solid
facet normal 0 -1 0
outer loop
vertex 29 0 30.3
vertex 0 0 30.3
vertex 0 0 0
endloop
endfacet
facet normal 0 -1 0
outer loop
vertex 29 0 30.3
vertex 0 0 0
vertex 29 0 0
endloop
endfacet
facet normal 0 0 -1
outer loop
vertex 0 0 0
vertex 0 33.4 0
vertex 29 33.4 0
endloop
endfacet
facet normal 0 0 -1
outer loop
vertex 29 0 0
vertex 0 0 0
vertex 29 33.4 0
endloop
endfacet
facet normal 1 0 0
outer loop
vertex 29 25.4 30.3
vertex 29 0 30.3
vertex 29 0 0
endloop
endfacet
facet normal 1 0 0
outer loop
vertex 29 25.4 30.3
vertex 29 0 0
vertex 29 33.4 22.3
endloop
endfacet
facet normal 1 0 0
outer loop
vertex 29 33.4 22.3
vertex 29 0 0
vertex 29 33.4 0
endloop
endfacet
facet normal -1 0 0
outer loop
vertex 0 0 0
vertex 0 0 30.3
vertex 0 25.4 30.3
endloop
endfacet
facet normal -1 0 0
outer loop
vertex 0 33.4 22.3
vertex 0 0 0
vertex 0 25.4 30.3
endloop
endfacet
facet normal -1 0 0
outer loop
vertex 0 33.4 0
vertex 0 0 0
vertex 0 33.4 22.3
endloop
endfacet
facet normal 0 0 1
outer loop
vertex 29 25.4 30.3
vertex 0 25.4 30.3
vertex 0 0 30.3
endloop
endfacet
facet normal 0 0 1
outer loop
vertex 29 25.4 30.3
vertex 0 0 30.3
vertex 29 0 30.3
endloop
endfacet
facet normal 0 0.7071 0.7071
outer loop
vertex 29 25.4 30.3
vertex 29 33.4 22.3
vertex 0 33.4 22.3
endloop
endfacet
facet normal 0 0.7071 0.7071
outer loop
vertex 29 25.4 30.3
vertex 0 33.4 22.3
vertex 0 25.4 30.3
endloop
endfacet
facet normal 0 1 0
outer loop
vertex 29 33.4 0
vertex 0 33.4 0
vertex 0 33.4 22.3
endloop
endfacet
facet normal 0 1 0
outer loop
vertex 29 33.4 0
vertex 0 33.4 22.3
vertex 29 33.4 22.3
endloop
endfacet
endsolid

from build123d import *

# Parameters (mm, degrees)
SKETCH1_W           = 29
SKETCH1_H           = 33.4
BOSS_EXTRUDE2_DEPTH = 30.3
CUT_EXTRUDE1_DEPTH  = 54.615762608


with BuildPart() as part:
    # Sketch1 → Boss-Extrude2 (new body)
    with BuildSketch(Plane.XY):
        with Locations((14.5, 16.7)):
            Rectangle(SKETCH1_W, SKETCH1_H)
    extrude(amount=BOSS_EXTRUDE2_DEPTH)

    # Sketch2 → Cut-Extrude1 (cut, through all)
    with BuildSketch(Plane.ZY):
        Polygon((22.3, 33.4), (30.3, 25.4), (30.3, 33.4), align=None)
    extrude(amount=-CUT_EXTRUDE1_DEPTH, mode=Mode.SUBTRACT)


solid = part.part
